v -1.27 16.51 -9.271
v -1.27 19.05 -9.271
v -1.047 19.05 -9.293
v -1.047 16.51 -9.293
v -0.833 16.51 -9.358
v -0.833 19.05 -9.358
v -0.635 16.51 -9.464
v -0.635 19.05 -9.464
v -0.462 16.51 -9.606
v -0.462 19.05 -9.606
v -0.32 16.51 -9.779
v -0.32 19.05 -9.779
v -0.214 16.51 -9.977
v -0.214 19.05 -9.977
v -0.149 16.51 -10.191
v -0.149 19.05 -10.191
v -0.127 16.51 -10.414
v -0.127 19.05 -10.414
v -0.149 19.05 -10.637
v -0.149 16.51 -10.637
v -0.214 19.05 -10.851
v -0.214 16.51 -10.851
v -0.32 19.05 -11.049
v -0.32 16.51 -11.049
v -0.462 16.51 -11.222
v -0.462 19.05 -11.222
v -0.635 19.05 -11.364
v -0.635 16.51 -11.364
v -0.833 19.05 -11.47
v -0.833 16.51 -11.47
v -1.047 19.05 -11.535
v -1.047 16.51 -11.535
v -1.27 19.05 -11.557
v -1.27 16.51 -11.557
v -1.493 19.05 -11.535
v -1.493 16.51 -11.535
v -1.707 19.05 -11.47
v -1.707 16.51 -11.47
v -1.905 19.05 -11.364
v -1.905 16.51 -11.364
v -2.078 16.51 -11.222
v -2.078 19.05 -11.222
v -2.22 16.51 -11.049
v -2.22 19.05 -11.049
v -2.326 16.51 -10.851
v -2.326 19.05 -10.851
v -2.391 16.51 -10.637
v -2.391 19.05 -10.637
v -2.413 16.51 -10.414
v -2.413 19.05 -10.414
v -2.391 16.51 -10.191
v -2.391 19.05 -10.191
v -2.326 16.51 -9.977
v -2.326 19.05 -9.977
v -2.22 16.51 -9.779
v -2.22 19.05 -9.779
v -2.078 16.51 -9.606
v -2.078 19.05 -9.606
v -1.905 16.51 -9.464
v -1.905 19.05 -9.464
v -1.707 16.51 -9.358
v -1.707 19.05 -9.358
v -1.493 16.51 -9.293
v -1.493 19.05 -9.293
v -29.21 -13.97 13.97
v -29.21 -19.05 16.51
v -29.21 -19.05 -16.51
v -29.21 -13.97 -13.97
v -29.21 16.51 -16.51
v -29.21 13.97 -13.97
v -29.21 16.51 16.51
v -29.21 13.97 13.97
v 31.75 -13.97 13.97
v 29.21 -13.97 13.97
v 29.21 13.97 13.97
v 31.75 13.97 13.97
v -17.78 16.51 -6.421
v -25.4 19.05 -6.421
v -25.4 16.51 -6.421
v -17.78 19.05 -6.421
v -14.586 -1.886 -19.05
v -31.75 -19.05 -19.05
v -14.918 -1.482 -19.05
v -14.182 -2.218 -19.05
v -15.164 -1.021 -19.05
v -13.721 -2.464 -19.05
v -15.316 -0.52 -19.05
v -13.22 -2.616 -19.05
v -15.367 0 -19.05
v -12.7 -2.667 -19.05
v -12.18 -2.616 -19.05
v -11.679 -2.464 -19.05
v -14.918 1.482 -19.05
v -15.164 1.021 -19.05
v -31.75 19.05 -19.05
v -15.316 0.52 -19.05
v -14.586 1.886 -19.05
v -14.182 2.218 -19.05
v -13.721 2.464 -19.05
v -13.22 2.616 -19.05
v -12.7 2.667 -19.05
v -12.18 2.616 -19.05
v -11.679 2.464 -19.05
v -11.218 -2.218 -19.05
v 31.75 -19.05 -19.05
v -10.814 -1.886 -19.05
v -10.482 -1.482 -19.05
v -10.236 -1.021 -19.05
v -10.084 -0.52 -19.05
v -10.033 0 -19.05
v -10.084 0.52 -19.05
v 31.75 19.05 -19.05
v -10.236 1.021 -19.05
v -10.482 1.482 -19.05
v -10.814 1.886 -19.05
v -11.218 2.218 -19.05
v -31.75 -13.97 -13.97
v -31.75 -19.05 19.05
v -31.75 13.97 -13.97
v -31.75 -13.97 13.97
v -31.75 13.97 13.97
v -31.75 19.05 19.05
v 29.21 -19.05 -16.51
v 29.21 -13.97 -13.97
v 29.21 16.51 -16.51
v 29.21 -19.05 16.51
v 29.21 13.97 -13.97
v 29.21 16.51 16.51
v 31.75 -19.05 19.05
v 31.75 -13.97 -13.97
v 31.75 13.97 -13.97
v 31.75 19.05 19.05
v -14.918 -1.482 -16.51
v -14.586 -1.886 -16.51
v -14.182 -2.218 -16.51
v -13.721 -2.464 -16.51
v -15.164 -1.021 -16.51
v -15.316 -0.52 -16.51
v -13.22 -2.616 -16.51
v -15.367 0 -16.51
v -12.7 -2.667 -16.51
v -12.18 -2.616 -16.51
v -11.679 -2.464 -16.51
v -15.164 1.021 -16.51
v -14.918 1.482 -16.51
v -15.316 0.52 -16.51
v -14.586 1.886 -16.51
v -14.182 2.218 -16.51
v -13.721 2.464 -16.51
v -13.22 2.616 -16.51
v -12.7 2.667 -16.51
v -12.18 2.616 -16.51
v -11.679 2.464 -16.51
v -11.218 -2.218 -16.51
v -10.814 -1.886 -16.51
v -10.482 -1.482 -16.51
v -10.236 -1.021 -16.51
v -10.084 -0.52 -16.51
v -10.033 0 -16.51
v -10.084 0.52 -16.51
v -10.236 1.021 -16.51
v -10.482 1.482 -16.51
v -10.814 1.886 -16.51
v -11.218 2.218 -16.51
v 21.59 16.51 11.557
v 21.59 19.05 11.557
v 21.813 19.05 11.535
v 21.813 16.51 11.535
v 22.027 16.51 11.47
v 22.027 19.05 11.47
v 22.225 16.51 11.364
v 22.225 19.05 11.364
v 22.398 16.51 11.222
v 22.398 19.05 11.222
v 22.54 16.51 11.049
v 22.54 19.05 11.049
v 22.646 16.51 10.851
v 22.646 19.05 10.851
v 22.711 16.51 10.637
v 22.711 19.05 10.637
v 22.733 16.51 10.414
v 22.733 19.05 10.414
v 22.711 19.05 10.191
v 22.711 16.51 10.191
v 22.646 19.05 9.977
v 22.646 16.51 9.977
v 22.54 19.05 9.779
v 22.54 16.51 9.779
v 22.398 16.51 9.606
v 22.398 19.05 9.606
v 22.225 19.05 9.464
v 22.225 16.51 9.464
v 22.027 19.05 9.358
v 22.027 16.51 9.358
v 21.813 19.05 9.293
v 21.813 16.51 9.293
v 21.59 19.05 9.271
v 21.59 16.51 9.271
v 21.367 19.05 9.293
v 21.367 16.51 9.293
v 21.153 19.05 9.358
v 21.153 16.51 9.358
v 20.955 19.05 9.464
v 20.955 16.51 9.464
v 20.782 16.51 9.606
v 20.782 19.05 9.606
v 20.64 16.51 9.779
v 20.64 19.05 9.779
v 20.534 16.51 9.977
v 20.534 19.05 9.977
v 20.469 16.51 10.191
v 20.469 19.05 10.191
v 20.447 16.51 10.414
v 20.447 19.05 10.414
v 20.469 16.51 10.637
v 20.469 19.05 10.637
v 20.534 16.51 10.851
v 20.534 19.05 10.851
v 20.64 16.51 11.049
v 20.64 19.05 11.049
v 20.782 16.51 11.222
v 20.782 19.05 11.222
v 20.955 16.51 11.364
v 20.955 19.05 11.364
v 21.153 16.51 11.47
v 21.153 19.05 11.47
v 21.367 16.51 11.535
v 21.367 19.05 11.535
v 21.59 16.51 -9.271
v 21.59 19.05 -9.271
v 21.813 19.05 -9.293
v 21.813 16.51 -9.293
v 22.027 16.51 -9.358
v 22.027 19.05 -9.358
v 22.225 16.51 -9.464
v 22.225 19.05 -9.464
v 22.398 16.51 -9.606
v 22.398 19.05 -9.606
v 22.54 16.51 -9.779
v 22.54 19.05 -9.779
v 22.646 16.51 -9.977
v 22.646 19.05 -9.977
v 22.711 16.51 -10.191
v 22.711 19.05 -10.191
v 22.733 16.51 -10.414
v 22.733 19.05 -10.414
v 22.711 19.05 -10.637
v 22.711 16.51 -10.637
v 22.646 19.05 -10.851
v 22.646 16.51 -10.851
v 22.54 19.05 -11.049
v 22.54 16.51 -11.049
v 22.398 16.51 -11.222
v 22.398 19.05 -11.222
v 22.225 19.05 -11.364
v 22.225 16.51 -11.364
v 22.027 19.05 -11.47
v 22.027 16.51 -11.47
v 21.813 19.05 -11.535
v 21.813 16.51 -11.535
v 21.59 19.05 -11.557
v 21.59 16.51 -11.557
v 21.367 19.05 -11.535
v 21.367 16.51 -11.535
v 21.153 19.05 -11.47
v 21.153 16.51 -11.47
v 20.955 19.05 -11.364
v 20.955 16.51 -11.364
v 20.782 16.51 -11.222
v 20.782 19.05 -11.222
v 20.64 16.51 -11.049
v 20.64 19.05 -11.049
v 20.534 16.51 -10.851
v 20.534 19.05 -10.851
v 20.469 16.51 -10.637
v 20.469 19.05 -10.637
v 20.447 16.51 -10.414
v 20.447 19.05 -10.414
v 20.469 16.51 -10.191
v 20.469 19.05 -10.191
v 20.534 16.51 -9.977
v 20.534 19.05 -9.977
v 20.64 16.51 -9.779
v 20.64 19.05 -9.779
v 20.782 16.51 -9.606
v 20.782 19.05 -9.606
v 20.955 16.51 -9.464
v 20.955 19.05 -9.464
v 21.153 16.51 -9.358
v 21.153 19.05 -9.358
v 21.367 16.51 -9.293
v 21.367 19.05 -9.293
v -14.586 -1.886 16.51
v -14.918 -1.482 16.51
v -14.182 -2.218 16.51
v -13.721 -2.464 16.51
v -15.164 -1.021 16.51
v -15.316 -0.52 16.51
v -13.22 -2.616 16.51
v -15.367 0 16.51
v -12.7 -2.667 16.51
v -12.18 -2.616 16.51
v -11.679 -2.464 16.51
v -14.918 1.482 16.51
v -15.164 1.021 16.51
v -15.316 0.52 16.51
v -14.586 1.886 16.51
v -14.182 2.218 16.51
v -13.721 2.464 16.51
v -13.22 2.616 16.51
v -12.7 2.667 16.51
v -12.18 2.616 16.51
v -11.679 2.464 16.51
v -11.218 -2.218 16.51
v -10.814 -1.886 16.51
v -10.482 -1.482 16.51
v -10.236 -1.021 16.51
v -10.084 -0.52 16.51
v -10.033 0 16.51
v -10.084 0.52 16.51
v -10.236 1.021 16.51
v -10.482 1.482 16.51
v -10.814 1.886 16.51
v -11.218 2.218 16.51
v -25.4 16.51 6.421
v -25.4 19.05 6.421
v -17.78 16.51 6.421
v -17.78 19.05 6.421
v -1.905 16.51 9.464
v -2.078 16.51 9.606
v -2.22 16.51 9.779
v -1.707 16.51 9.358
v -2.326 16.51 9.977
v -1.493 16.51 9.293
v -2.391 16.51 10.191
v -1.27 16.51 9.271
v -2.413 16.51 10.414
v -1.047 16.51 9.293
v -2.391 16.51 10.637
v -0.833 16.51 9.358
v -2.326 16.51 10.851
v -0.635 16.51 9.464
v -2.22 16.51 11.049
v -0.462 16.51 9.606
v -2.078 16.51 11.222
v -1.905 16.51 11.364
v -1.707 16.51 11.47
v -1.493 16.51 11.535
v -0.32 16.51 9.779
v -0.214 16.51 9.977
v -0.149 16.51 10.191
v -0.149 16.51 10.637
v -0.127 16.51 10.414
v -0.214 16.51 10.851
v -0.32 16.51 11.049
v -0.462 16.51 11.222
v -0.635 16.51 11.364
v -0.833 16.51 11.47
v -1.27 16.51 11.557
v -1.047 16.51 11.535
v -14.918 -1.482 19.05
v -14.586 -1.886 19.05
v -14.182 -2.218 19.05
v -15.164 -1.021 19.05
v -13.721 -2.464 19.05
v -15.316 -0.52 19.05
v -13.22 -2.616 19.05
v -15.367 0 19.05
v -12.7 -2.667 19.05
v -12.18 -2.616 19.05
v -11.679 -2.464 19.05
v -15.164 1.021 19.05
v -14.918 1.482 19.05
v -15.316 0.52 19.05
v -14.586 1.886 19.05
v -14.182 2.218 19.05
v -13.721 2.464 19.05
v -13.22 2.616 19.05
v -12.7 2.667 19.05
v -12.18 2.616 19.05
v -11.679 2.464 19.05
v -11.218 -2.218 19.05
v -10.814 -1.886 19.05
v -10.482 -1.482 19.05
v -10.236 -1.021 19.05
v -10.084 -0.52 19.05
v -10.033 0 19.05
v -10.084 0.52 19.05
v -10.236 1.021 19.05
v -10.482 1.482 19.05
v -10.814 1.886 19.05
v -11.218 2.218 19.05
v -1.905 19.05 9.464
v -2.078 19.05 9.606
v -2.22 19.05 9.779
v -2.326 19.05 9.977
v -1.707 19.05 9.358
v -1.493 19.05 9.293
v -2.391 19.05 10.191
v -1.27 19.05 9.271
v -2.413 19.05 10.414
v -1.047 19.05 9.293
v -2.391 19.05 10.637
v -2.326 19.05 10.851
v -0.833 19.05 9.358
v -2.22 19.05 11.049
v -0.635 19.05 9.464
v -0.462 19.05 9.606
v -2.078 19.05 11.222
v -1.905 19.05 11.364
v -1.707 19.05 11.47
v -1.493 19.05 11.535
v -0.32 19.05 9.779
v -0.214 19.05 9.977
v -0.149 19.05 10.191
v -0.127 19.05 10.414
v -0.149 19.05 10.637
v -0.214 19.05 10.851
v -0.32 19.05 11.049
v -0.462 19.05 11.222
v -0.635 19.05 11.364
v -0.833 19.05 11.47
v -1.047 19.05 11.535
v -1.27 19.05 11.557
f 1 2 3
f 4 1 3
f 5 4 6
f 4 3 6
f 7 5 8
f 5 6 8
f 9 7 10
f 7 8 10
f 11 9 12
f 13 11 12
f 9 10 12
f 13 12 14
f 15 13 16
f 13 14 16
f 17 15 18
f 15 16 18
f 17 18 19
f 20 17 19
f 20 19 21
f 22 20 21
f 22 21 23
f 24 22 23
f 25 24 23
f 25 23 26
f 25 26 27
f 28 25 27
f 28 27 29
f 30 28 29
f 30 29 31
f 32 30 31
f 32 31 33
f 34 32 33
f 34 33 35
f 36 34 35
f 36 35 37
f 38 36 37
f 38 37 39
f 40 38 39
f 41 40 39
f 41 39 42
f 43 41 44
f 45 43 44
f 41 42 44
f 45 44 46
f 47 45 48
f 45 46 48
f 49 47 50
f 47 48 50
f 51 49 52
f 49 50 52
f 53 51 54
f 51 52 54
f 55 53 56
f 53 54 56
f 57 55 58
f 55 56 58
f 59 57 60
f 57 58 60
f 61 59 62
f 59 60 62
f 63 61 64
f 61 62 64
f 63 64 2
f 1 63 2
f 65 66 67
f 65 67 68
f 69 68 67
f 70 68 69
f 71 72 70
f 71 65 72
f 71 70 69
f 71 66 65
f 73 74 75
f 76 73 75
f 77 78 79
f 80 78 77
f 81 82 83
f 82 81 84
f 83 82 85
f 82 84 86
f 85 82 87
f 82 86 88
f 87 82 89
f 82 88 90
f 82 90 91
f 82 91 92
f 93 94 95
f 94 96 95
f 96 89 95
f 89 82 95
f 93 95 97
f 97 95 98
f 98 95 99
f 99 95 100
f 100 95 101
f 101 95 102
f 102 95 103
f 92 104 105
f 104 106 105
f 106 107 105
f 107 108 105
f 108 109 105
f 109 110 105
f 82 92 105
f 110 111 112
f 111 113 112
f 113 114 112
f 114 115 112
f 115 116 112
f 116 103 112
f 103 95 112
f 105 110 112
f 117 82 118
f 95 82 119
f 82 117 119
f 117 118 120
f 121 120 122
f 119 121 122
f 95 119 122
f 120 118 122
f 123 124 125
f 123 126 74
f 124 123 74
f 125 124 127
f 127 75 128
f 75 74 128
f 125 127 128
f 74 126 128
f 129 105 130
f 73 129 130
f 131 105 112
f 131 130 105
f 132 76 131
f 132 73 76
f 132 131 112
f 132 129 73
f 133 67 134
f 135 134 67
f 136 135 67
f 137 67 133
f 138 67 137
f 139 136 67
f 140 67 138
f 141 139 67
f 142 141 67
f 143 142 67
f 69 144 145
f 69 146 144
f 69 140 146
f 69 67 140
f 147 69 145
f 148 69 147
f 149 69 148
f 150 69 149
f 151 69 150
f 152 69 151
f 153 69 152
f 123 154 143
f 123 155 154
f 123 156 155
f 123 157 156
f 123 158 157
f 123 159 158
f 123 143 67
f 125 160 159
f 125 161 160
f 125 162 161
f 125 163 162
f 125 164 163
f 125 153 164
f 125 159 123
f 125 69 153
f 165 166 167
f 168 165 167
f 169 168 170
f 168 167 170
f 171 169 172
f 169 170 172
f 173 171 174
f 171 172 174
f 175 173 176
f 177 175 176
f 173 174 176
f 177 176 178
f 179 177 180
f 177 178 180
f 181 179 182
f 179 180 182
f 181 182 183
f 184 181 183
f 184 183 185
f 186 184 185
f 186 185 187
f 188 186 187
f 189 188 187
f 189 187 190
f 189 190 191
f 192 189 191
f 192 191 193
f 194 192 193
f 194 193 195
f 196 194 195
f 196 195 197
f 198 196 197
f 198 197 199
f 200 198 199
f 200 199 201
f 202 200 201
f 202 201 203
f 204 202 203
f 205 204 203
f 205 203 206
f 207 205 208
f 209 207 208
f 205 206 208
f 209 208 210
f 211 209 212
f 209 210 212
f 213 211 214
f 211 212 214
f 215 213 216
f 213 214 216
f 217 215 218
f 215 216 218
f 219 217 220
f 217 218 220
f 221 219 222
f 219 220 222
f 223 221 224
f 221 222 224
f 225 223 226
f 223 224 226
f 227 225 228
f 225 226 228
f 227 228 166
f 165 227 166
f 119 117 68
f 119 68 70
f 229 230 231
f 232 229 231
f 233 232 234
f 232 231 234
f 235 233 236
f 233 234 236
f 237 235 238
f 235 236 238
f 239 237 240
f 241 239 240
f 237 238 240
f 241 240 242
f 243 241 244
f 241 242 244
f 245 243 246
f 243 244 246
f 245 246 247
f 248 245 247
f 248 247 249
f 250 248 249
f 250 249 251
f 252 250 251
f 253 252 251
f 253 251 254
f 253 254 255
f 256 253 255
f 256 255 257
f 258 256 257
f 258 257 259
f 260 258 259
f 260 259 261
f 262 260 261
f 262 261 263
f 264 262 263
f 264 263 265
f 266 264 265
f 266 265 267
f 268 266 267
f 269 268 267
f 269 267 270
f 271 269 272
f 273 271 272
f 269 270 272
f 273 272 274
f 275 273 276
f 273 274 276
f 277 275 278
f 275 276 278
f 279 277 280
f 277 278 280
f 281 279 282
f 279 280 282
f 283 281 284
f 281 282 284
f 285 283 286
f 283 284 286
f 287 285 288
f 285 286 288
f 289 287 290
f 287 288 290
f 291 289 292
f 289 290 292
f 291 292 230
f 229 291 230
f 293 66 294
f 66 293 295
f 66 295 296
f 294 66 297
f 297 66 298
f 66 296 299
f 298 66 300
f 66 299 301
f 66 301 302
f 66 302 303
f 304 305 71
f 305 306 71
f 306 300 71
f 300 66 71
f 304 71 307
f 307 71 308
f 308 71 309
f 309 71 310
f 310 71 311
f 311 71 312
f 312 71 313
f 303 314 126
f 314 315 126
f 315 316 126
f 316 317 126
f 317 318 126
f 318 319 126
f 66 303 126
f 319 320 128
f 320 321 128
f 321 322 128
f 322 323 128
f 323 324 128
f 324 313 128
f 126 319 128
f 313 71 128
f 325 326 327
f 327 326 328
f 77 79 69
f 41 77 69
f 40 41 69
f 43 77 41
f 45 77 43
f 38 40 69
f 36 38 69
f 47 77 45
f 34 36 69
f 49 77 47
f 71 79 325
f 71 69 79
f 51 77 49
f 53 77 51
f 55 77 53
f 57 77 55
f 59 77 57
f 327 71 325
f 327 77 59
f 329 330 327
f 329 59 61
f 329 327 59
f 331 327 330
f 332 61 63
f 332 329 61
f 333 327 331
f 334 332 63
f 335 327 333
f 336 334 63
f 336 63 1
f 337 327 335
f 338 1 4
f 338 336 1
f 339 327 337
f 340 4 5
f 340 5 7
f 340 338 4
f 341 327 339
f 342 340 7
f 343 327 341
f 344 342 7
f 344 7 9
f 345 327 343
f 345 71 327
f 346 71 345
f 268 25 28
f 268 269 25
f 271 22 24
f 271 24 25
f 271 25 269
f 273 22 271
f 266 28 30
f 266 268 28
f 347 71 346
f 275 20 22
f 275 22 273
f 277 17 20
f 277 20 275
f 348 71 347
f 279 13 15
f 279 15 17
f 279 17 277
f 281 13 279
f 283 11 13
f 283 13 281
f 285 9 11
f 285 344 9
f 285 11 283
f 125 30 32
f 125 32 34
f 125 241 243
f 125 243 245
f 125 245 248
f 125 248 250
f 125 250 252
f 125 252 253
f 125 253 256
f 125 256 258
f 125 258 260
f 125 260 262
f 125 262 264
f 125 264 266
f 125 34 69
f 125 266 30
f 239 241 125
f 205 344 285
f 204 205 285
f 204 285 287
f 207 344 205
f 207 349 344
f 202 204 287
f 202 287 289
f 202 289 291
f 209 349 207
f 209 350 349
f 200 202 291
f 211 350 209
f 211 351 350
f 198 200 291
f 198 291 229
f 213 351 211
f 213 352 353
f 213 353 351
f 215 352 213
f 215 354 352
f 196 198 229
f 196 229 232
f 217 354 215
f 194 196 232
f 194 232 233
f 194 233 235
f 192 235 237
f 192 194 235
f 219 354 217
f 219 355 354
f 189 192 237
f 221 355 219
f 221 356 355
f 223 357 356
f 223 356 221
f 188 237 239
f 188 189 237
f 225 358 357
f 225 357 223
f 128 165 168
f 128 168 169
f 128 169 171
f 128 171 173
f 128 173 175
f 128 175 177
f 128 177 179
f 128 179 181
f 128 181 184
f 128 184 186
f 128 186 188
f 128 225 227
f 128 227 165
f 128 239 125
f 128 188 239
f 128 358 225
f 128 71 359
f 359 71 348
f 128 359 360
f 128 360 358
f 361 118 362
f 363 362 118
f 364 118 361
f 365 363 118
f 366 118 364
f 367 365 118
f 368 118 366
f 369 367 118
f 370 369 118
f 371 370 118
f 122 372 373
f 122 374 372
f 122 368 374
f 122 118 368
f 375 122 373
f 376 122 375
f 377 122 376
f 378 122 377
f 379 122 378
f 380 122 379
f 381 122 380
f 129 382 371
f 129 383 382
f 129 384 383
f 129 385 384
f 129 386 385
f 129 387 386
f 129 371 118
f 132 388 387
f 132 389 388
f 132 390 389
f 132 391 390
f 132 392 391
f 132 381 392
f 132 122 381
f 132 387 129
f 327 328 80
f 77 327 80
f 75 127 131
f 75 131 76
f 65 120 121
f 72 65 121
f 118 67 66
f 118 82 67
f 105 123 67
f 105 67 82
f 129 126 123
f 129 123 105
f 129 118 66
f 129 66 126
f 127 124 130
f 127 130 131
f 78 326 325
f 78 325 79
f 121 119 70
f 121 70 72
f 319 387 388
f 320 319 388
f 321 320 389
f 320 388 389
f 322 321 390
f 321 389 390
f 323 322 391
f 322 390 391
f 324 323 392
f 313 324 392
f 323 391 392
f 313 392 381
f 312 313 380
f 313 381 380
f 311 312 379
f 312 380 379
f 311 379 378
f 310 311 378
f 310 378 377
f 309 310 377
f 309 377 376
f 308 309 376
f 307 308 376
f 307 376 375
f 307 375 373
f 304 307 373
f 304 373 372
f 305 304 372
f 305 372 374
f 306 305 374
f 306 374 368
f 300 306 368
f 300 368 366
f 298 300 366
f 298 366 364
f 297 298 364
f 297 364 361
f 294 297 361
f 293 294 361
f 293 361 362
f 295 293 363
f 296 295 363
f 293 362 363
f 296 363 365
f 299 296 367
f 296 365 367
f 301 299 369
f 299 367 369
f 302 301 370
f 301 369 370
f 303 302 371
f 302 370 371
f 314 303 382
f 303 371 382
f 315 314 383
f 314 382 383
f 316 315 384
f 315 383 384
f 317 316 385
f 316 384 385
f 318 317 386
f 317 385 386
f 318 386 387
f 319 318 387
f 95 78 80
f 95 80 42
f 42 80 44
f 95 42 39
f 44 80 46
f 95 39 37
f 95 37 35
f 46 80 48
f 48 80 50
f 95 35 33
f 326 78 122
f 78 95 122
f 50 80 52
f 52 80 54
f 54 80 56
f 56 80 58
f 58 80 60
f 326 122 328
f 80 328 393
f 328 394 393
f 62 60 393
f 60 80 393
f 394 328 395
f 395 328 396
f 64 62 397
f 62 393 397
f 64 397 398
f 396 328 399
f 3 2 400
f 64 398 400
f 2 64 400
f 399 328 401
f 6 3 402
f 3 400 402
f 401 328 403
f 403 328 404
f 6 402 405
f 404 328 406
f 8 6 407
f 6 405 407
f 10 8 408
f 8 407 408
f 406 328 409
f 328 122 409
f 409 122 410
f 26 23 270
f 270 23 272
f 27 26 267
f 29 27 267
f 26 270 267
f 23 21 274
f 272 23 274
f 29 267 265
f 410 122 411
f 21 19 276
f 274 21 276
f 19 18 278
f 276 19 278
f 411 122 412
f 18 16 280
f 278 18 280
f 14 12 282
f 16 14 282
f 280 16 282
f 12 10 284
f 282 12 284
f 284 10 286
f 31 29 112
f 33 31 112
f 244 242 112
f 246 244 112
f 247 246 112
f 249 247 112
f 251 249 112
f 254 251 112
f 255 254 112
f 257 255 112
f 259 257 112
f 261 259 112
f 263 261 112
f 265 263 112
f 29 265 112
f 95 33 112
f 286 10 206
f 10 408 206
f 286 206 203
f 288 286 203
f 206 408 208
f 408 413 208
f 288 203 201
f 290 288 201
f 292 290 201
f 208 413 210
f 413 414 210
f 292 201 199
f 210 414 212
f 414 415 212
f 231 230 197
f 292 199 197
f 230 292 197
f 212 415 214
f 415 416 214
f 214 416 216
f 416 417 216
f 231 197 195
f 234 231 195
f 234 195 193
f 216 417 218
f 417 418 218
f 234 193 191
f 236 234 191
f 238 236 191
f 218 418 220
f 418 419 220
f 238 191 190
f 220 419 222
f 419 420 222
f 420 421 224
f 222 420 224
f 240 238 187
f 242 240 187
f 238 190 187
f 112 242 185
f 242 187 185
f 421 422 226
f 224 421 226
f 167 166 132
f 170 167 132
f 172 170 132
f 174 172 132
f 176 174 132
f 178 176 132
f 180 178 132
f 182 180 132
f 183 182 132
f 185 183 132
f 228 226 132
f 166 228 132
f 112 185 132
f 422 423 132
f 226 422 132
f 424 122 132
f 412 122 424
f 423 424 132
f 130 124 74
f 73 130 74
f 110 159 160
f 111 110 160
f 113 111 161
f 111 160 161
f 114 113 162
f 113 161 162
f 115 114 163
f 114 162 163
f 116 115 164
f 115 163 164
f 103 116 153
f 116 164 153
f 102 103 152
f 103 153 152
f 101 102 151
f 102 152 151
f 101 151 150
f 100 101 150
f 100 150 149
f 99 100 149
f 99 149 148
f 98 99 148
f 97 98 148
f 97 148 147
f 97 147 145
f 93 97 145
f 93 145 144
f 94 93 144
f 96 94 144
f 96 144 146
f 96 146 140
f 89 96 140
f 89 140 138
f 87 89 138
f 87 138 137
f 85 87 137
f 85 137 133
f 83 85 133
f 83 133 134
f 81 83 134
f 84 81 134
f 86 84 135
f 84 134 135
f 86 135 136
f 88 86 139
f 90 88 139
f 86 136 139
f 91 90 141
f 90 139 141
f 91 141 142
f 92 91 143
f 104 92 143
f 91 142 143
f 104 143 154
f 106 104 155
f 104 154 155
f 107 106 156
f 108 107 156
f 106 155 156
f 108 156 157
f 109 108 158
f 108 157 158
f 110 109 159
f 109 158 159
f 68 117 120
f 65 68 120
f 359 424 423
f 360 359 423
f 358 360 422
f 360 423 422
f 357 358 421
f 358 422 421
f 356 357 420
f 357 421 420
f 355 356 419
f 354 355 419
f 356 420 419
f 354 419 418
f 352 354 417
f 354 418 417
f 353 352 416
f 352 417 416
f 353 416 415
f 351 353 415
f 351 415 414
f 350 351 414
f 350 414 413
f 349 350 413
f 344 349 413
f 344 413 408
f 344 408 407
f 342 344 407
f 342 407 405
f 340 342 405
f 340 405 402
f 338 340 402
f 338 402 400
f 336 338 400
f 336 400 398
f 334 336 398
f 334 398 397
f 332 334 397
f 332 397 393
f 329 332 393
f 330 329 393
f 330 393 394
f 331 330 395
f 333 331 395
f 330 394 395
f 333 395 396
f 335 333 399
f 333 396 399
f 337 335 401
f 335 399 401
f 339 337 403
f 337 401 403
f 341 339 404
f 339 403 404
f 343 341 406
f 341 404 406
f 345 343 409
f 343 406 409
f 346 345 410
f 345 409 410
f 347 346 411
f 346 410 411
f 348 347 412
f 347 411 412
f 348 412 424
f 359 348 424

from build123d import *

# Parameters (mm, degrees)
SKETCH1_W           = 63.5
SKETCH1_H           = 38.1
BOSS_EXTRUDE1_DEPTH = 19.05
SHELL1_T            = -2.54
SKETCH2_R           = 1.143
CUT_EXTRUDE1_DEPTH  = 54.127911685
SKETCH4_W           = 7.62
SKETCH4_H           = 12.842115784
CUT_EXTRUDE2_DEPTH  = 54.127911685
SKETCH5_R           = 2.667
CUT_EXTRUDE3_DEPTH  = 54.127911685
SKETCH6_W           = 27.94
SKETCH6_H           = 27.94
CUT_EXTRUDE4_DEPTH  = 69.978656119


with BuildPart() as part:
    # Sketch1 → Boss-Extrude1 (new, symmetric)
    with BuildSketch(Plane.XY):
        Rectangle(SKETCH1_W, SKETCH1_H)
    extrude(amount=BOSS_EXTRUDE1_DEPTH, both=True)

    # Shell1
    shell1_openings = [part.faces().sort_by_distance(p)[0] for p in [
        (0, -19.05, 0),
    ]]
    offset(amount=SHELL1_T, openings=shell1_openings, kind=Kind.INTERSECTION)

    # Sketch2 → Cut-Extrude1 (cut, through all)
    with BuildSketch(Plane(origin=(0, 19.05, 0), x_dir=(1, 0, 0), z_dir=(0, 1, 0))):
        with Locations(Location((-1.27, 10.414, 0), (0, 0, 270))):
            Circle(SKETCH2_R)
        with Locations(Location((21.59, 10.414, 0), (0, 0, 270))):
            Circle(SKETCH2_R)
        with Locations(Location((21.59, -10.414, 0), (0, 0, 270))):
            Circle(SKETCH2_R)
        with Locations(Location((-1.27, -10.414, 0), (0, 0, 270))):
            Circle(SKETCH2_R)
    extrude(amount=-CUT_EXTRUDE1_DEPTH, mode=Mode.SUBTRACT)

    # Sketch4 → Cut-Extrude2 (cut, through all)
    with BuildSketch(Plane(origin=(0, 19.05, 0), x_dir=(1, 0, 0), z_dir=(0, 1, 0))):
        with Locations((-21.59, 0)):
            Rectangle(SKETCH4_W, SKETCH4_H)
    extrude(amount=-CUT_EXTRUDE2_DEPTH, mode=Mode.SUBTRACT)

    # Sketch5 → Cut-Extrude3 (cut, through all)
    with BuildSketch(Plane.XY.offset(19.05)):
        with Locations((-12.7, 0)):
            Circle(SKETCH5_R)
    extrude(amount=-CUT_EXTRUDE3_DEPTH, mode=Mode.SUBTRACT)

    # Sketch6 → Cut-Extrude4 (cut, through all)
    with BuildSketch(Plane.ZY.offset(31.75)):
        Rectangle(SKETCH6_W, SKETCH6_H)
    extrude(amount=-CUT_EXTRUDE4_DEPTH, mode=Mode.SUBTRACT)


solid = part.part
